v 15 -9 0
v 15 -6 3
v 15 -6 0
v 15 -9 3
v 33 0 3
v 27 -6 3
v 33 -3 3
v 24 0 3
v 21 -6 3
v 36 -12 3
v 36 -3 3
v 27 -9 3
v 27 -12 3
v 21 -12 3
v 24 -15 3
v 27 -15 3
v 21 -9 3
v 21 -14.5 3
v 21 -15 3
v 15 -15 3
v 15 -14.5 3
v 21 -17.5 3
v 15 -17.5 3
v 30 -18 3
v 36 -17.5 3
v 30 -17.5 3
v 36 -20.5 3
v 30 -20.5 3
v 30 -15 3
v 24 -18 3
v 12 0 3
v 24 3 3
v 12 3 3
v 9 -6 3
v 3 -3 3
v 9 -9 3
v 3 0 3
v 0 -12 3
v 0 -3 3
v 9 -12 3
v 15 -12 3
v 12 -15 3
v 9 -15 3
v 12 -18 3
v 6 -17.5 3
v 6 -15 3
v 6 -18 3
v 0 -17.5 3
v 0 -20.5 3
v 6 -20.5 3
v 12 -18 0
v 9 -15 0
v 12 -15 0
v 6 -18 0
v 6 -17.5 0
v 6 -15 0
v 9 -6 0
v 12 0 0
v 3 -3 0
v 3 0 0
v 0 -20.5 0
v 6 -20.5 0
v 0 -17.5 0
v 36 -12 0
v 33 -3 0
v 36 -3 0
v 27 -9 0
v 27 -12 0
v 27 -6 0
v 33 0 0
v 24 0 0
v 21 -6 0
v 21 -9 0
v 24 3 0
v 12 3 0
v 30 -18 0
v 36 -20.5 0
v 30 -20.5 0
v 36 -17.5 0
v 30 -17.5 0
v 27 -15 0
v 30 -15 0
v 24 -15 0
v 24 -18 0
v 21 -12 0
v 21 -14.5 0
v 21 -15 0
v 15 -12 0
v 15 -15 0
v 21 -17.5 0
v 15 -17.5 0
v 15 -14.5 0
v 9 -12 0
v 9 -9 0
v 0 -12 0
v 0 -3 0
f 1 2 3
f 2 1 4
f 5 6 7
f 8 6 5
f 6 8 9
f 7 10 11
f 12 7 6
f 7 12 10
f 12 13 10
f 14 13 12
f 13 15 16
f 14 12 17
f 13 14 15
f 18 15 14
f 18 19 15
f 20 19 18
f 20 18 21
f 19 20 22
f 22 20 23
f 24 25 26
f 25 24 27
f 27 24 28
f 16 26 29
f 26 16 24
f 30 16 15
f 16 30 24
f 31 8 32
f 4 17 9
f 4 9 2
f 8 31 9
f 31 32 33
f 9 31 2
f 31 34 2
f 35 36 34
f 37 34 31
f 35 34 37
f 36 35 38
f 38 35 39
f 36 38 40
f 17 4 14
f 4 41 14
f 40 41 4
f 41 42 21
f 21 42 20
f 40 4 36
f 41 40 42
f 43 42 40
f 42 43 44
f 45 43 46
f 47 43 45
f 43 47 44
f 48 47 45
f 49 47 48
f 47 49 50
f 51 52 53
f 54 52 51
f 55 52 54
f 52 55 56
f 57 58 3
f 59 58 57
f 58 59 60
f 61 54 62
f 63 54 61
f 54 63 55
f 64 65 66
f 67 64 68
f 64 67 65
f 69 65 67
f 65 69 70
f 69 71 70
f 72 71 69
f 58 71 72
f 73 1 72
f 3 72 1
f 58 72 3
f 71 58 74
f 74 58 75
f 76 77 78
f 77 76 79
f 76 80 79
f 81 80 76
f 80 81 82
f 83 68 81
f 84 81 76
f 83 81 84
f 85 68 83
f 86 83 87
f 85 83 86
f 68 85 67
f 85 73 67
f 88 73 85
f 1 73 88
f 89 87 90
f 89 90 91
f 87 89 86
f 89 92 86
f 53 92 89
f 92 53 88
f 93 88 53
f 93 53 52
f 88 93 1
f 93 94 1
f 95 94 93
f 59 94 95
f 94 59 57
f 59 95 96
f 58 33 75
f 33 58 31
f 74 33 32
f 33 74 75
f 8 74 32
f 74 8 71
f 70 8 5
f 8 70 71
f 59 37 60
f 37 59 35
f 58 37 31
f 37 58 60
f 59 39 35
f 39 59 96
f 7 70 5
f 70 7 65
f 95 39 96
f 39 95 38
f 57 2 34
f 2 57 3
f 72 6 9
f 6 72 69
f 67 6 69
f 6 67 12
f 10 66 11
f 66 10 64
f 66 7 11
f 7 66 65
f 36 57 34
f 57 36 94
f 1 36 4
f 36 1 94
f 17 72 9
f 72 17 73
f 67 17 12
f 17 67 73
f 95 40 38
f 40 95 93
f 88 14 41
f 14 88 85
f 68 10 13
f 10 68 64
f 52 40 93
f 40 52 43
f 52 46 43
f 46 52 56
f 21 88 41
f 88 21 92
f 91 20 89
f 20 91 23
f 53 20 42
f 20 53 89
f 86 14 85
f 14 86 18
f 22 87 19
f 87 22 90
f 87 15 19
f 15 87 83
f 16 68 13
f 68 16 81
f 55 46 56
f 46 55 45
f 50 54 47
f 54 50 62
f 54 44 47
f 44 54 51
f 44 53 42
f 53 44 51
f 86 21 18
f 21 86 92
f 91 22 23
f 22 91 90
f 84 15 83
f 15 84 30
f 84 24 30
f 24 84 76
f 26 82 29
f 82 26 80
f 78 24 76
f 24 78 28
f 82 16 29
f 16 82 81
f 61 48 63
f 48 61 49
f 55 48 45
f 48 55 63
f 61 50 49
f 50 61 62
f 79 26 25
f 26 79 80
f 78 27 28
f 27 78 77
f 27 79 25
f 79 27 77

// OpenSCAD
union() {
	translate(v = [0, 0, 0]) {
		translate(v = [12, 0, 0]) {
			color(alpha = 1.0, c = "white") {
				cube(size = 3);
			}
		}
	}
	translate(v = [0, 0, 0]) {
		translate(v = [15, 0, 0]) {
			color(alpha = 1.0, c = "white") {
				cube(size = 3);
			}
		}
	}
	translate(v = [0, 0, 0]) {
		translate(v = [18, 0, 0]) {
			color(alpha = 1.0, c = "white") {
				cube(size = 3);
			}
		}
	}
	translate(v = [0, 0, 0]) {
		translate(v = [21, 0, 0]) {
			color(alpha = 1.0, c = "white") {
				cube(size = 3);
			}
		}
	}
	translate(v = [0, -3, 0]) {
		translate(v = [3, 0, 0]) {
			color(alpha = 1.0, c = "white") {
				cube(size = 3);
			}
		}
	}
	translate(v = [0, -3, 0]) {
		translate(v = [6, 0, 0]) {
			color(alpha = 1.0, c = "white") {
				cube(size = 3);
			}
		}
	}
	translate(v = [0, -3, 0]) {
		translate(v = [9, 0, 0]) {
			color(alpha = 1.0, c = "white") {
				cube(size = 3);
			}
		}
	}
	translate(v = [0, -3, 0]) {
		translate(v = [12, 0, 0]) {
			color(alpha = 1.0, c = "white") {
				cube(size = 3);
			}
		}
	}
	translate(v = [0, -3, 0]) {
		translate(v = [15, 0, 0]) {
			color(alpha = 1.0, c = "white") {
				cube(size = 3);
			}
		}
	}
	translate(v = [0, -3, 0]) {
		translate(v = [18, 0, 0]) {
			color(alpha = 1.0, c = "white") {
				cube(size = 3);
			}
		}
	}
	translate(v = [0, -3, 0]) {
		translate(v = [21, 0, 0]) {
			color(alpha = 1.0, c = "white") {
				cube(size = 3);
			}
		}
	}
	translate(v = [0, -3, 0]) {
		translate(v = [24, 0, 0]) {
			color(alpha = 1.0, c = "white") {
				cube(size = 3);
			}
		}
	}
	translate(v = [0, -3, 0]) {
		translate(v = [27, 0, 0]) {
			color(alpha = 1.0, c = "white") {
				cube(size = 3);
			}
		}
	}
	translate(v = [0, -3, 0]) {
		translate(v = [30, 0, 0]) {
			color(alpha = 1.0, c = "white") {
				cube(size = 3);
			}
		}
	}
	translate(v = [0, -6, 0]) {
		translate(v = [0, 0, 0]) {
			color(alpha = 1.0, c = "white") {
				cube(size = 3);
			}
		}
	}
	translate(v = [0, -6, 0]) {
		translate(v = [3, 0, 0]) {
			color(alpha = 1.0, c = "white") {
				cube(size = 3);
			}
		}
	}
	translate(v = [0, -6, 0]) {
		translate(v = [6, 0, 0]) {
			color(alpha = 1.0, c = "white") {
				cube(size = 3);
			}
		}
	}
	translate(v = [0, -6, 0]) {
		translate(v = [9, 0, 0]) {
			color(alpha = 1.0, c = "white") {
				cube(size = 3);
			}
		}
	}
	translate(v = [0, -6, 0]) {
		translate(v = [12, 0, 0]) {
			color(alpha = 1.0, c = "white") {
				cube(size = 3);
			}
		}
	}
	translate(v = [0, -6, 0]) {
		translate(v = [15, 0, 0]) {
			color(alpha = 1.0, c = "white") {
				cube(size = 3);
			}
		}
	}
	translate(v = [0, -6, 0]) {
		translate(v = [18, 0, 0]) {
			color(alpha = 1.0, c = "white") {
				cube(size = 3);
			}
		}
	}
	translate(v = [0, -6, 0]) {
		translate(v = [21, 0, 0]) {
			color(alpha = 1.0, c = "white") {
				cube(size = 3);
			}
		}
	}
	translate(v = [0, -6, 0]) {
		translate(v = [24, 0, 0]) {
			color(alpha = 1.0, c = "white") {
				cube(size = 3);
			}
		}
	}
	translate(v = [0, -6, 0]) {
		translate(v = [27, 0, 0]) {
			color(alpha = 1.0, c = "white") {
				cube(size = 3);
			}
		}
	}
	translate(v = [0, -6, 0]) {
		translate(v = [30, 0, 0]) {
			color(alpha = 1.0, c = "white") {
				cube(size = 3);
			}
		}
	}
	translate(v = [0, -6, 0]) {
		translate(v = [33, 0, 0]) {
			color(alpha = 1.0, c = "white") {
				cube(size = 3);
			}
		}
	}
	translate(v = [0, -9, 0]) {
		translate(v = [0, 0, 0]) {
			color(alpha = 1.0, c = "white") {
				cube(size = 3);
			}
		}
	}
	translate(v = [0, -9, 0]) {
		translate(v = [3, 0, 0]) {
			color(alpha = 1.0, c = "white") {
				cube(size = 3);
			}
		}
	}
	translate(v = [0, -9, 0]) {
		translate(v = [6, 0, 0]) {
			color(alpha = 1.0, c = "white") {
				cube(size = 3);
			}
		}
	}
	translate(v = [0, -9, 0]) {
		translate(v = [15, 0, 0]) {
			color(alpha = 1.0, c = "white") {
				cube(size = 3);
			}
		}
	}
	translate(v = [0, -9, 0]) {
		translate(v = [18, 0, 0]) {
			color(alpha = 1.0, c = "white") {
				cube(size = 3);
			}
		}
	}
	translate(v = [0, -9, 0]) {
		translate(v = [27, 0, 0]) {
			color(alpha = 1.0, c = "white") {
				cube(size = 3);
			}
		}
	}
	translate(v = [0, -9, 0]) {
		translate(v = [30, 0, 0]) {
			color(alpha = 1.0, c = "white") {
				cube(size = 3);
			}
		}
	}
	translate(v = [0, -9, 0]) {
		translate(v = [33, 0, 0]) {
			color(alpha = 1.0, c = "white") {
				cube(size = 3);
			}
		}
	}
	translate(v = [0, -12, 0]) {
		translate(v = [0, 0, 0]) {
			color(alpha = 1.0, c = "white") {
				cube(size = 3);
			}
		}
	}
	translate(v = [0, -12, 0]) {
		translate(v = [3, 0, 0]) {
			color(alpha = 1.0, c = "white") {
				cube(size = 3);
			}
		}
	}
	translate(v = [0, -12, 0]) {
		translate(v = [6, 0, 0]) {
			color(alpha = 1.0, c = "white") {
				cube(size = 3);
			}
		}
	}
	translate(v = [0, -12, 0]) {
		translate(v = [9, 0, 0]) {
			color(alpha = 1.0, c = "white") {
				cube(size = 3);
			}
		}
	}
	translate(v = [0, -12, 0]) {
		translate(v = [12, 0, 0]) {
			color(alpha = 1.0, c = "white") {
				cube(size = 3);
			}
		}
	}
	translate(v = [0, -12, 0]) {
		translate(v = [15, 0, 0]) {
			color(alpha = 1.0, c = "white") {
				cube(size = 3);
			}
		}
	}
	translate(v = [0, -12, 0]) {
		translate(v = [18, 0, 0]) {
			color(alpha = 1.0, c = "white") {
				cube(size = 3);
			}
		}
	}
	translate(v = [0, -12, 0]) {
		translate(v = [21, 0, 0]) {
			color(alpha = 1.0, c = "white") {
				cube(size = 3);
			}
		}
	}
	translate(v = [0, -12, 0]) {
		translate(v = [24, 0, 0]) {
			color(alpha = 1.0, c = "white") {
				cube(size = 3);
			}
		}
	}
	translate(v = [0, -12, 0]) {
		translate(v = [27, 0, 0]) {
			color(alpha = 1.0, c = "white") {
				cube(size = 3);
			}
		}
	}
	translate(v = [0, -12, 0]) {
		translate(v = [30, 0, 0]) {
			color(alpha = 1.0, c = "white") {
				cube(size = 3);
			}
		}
	}
	translate(v = [0, -12, 0]) {
		translate(v = [33, 0, 0]) {
			color(alpha = 1.0, c = "white") {
				cube(size = 3);
			}
		}
	}
	translate(v = [0, -15, 0]) {
		translate(v = [9, 0, 0]) {
			color(alpha = 1.0, c = "white") {
				cube(size = 3);
			}
		}
	}
	translate(v = [0, -15, 0]) {
		translate(v = [12, 0, 0]) {
			color(alpha = 1.0, c = "white") {
				cube(size = 3);
			}
		}
	}
	translate(v = [0, -15, 0]) {
		translate(v = [21, 0, 0]) {
			color(alpha = 1.0, c = "white") {
				cube(size = 3);
			}
		}
	}
	translate(v = [0, -15, 0]) {
		translate(v = [24, 0, 0]) {
			color(alpha = 1.0, c = "white") {
				cube(size = 3);
			}
		}
	}
	translate(v = [0, -18, 0]) {
		translate(v = [6, 0, 0]) {
			color(alpha = 1.0, c = "white") {
				cube(size = 3);
			}
		}
	}
	translate(v = [0, -18, 0]) {
		translate(v = [9, 0, 0]) {
			color(alpha = 1.0, c = "white") {
				cube(size = 3);
			}
		}
	}
	translate(v = [0, 0.5, 0]) {
		translate(v = [0, -18, 0]) {
			translate(v = [15, 0, 0]) {
				color(alpha = 1.0, c = "white") {
					cube(size = 3);
				}
			}
		}
	}
	translate(v = [0, 0.5, 0]) {
		translate(v = [0, -18, 0]) {
			translate(v = [18, 0, 0]) {
				color(alpha = 1.0, c = "white") {
					cube(size = 3);
				}
			}
		}
	}
	translate(v = [0, -18, 0]) {
		translate(v = [24, 0, 0]) {
			color(alpha = 1.0, c = "white") {
				cube(size = 3);
			}
		}
	}
	translate(v = [0, -18, 0]) {
		translate(v = [27, 0, 0]) {
			color(alpha = 1.0, c = "white") {
				cube(size = 3);
			}
		}
	}
	translate(v = [0, 0.5, 0]) {
		translate(v = [0, -21, 0]) {
			translate(v = [0, 0, 0]) {
				color(alpha = 1.0, c = "white") {
					cube(size = 3);
				}
			}
		}
	}
	translate(v = [0, 0.5, 0]) {
		translate(v = [0, -21, 0]) {
			translate(v = [3, 0, 0]) {
				color(alpha = 1.0, c = "white") {
					cube(size = 3);
				}
			}
		}
	}
	translate(v = [0, 0.5, 0]) {
		translate(v = [0, -21, 0]) {
			translate(v = [30, 0, 0]) {
				color(alpha = 1.0, c = "white") {
					cube(size = 3);
				}
			}
		}
	}
	translate(v = [0, 0.5, 0]) {
		translate(v = [0, -21, 0]) {
			translate(v = [33, 0, 0]) {
				color(alpha = 1.0, c = "white") {
					cube(size = 3);
				}
			}
		}
	}
}
